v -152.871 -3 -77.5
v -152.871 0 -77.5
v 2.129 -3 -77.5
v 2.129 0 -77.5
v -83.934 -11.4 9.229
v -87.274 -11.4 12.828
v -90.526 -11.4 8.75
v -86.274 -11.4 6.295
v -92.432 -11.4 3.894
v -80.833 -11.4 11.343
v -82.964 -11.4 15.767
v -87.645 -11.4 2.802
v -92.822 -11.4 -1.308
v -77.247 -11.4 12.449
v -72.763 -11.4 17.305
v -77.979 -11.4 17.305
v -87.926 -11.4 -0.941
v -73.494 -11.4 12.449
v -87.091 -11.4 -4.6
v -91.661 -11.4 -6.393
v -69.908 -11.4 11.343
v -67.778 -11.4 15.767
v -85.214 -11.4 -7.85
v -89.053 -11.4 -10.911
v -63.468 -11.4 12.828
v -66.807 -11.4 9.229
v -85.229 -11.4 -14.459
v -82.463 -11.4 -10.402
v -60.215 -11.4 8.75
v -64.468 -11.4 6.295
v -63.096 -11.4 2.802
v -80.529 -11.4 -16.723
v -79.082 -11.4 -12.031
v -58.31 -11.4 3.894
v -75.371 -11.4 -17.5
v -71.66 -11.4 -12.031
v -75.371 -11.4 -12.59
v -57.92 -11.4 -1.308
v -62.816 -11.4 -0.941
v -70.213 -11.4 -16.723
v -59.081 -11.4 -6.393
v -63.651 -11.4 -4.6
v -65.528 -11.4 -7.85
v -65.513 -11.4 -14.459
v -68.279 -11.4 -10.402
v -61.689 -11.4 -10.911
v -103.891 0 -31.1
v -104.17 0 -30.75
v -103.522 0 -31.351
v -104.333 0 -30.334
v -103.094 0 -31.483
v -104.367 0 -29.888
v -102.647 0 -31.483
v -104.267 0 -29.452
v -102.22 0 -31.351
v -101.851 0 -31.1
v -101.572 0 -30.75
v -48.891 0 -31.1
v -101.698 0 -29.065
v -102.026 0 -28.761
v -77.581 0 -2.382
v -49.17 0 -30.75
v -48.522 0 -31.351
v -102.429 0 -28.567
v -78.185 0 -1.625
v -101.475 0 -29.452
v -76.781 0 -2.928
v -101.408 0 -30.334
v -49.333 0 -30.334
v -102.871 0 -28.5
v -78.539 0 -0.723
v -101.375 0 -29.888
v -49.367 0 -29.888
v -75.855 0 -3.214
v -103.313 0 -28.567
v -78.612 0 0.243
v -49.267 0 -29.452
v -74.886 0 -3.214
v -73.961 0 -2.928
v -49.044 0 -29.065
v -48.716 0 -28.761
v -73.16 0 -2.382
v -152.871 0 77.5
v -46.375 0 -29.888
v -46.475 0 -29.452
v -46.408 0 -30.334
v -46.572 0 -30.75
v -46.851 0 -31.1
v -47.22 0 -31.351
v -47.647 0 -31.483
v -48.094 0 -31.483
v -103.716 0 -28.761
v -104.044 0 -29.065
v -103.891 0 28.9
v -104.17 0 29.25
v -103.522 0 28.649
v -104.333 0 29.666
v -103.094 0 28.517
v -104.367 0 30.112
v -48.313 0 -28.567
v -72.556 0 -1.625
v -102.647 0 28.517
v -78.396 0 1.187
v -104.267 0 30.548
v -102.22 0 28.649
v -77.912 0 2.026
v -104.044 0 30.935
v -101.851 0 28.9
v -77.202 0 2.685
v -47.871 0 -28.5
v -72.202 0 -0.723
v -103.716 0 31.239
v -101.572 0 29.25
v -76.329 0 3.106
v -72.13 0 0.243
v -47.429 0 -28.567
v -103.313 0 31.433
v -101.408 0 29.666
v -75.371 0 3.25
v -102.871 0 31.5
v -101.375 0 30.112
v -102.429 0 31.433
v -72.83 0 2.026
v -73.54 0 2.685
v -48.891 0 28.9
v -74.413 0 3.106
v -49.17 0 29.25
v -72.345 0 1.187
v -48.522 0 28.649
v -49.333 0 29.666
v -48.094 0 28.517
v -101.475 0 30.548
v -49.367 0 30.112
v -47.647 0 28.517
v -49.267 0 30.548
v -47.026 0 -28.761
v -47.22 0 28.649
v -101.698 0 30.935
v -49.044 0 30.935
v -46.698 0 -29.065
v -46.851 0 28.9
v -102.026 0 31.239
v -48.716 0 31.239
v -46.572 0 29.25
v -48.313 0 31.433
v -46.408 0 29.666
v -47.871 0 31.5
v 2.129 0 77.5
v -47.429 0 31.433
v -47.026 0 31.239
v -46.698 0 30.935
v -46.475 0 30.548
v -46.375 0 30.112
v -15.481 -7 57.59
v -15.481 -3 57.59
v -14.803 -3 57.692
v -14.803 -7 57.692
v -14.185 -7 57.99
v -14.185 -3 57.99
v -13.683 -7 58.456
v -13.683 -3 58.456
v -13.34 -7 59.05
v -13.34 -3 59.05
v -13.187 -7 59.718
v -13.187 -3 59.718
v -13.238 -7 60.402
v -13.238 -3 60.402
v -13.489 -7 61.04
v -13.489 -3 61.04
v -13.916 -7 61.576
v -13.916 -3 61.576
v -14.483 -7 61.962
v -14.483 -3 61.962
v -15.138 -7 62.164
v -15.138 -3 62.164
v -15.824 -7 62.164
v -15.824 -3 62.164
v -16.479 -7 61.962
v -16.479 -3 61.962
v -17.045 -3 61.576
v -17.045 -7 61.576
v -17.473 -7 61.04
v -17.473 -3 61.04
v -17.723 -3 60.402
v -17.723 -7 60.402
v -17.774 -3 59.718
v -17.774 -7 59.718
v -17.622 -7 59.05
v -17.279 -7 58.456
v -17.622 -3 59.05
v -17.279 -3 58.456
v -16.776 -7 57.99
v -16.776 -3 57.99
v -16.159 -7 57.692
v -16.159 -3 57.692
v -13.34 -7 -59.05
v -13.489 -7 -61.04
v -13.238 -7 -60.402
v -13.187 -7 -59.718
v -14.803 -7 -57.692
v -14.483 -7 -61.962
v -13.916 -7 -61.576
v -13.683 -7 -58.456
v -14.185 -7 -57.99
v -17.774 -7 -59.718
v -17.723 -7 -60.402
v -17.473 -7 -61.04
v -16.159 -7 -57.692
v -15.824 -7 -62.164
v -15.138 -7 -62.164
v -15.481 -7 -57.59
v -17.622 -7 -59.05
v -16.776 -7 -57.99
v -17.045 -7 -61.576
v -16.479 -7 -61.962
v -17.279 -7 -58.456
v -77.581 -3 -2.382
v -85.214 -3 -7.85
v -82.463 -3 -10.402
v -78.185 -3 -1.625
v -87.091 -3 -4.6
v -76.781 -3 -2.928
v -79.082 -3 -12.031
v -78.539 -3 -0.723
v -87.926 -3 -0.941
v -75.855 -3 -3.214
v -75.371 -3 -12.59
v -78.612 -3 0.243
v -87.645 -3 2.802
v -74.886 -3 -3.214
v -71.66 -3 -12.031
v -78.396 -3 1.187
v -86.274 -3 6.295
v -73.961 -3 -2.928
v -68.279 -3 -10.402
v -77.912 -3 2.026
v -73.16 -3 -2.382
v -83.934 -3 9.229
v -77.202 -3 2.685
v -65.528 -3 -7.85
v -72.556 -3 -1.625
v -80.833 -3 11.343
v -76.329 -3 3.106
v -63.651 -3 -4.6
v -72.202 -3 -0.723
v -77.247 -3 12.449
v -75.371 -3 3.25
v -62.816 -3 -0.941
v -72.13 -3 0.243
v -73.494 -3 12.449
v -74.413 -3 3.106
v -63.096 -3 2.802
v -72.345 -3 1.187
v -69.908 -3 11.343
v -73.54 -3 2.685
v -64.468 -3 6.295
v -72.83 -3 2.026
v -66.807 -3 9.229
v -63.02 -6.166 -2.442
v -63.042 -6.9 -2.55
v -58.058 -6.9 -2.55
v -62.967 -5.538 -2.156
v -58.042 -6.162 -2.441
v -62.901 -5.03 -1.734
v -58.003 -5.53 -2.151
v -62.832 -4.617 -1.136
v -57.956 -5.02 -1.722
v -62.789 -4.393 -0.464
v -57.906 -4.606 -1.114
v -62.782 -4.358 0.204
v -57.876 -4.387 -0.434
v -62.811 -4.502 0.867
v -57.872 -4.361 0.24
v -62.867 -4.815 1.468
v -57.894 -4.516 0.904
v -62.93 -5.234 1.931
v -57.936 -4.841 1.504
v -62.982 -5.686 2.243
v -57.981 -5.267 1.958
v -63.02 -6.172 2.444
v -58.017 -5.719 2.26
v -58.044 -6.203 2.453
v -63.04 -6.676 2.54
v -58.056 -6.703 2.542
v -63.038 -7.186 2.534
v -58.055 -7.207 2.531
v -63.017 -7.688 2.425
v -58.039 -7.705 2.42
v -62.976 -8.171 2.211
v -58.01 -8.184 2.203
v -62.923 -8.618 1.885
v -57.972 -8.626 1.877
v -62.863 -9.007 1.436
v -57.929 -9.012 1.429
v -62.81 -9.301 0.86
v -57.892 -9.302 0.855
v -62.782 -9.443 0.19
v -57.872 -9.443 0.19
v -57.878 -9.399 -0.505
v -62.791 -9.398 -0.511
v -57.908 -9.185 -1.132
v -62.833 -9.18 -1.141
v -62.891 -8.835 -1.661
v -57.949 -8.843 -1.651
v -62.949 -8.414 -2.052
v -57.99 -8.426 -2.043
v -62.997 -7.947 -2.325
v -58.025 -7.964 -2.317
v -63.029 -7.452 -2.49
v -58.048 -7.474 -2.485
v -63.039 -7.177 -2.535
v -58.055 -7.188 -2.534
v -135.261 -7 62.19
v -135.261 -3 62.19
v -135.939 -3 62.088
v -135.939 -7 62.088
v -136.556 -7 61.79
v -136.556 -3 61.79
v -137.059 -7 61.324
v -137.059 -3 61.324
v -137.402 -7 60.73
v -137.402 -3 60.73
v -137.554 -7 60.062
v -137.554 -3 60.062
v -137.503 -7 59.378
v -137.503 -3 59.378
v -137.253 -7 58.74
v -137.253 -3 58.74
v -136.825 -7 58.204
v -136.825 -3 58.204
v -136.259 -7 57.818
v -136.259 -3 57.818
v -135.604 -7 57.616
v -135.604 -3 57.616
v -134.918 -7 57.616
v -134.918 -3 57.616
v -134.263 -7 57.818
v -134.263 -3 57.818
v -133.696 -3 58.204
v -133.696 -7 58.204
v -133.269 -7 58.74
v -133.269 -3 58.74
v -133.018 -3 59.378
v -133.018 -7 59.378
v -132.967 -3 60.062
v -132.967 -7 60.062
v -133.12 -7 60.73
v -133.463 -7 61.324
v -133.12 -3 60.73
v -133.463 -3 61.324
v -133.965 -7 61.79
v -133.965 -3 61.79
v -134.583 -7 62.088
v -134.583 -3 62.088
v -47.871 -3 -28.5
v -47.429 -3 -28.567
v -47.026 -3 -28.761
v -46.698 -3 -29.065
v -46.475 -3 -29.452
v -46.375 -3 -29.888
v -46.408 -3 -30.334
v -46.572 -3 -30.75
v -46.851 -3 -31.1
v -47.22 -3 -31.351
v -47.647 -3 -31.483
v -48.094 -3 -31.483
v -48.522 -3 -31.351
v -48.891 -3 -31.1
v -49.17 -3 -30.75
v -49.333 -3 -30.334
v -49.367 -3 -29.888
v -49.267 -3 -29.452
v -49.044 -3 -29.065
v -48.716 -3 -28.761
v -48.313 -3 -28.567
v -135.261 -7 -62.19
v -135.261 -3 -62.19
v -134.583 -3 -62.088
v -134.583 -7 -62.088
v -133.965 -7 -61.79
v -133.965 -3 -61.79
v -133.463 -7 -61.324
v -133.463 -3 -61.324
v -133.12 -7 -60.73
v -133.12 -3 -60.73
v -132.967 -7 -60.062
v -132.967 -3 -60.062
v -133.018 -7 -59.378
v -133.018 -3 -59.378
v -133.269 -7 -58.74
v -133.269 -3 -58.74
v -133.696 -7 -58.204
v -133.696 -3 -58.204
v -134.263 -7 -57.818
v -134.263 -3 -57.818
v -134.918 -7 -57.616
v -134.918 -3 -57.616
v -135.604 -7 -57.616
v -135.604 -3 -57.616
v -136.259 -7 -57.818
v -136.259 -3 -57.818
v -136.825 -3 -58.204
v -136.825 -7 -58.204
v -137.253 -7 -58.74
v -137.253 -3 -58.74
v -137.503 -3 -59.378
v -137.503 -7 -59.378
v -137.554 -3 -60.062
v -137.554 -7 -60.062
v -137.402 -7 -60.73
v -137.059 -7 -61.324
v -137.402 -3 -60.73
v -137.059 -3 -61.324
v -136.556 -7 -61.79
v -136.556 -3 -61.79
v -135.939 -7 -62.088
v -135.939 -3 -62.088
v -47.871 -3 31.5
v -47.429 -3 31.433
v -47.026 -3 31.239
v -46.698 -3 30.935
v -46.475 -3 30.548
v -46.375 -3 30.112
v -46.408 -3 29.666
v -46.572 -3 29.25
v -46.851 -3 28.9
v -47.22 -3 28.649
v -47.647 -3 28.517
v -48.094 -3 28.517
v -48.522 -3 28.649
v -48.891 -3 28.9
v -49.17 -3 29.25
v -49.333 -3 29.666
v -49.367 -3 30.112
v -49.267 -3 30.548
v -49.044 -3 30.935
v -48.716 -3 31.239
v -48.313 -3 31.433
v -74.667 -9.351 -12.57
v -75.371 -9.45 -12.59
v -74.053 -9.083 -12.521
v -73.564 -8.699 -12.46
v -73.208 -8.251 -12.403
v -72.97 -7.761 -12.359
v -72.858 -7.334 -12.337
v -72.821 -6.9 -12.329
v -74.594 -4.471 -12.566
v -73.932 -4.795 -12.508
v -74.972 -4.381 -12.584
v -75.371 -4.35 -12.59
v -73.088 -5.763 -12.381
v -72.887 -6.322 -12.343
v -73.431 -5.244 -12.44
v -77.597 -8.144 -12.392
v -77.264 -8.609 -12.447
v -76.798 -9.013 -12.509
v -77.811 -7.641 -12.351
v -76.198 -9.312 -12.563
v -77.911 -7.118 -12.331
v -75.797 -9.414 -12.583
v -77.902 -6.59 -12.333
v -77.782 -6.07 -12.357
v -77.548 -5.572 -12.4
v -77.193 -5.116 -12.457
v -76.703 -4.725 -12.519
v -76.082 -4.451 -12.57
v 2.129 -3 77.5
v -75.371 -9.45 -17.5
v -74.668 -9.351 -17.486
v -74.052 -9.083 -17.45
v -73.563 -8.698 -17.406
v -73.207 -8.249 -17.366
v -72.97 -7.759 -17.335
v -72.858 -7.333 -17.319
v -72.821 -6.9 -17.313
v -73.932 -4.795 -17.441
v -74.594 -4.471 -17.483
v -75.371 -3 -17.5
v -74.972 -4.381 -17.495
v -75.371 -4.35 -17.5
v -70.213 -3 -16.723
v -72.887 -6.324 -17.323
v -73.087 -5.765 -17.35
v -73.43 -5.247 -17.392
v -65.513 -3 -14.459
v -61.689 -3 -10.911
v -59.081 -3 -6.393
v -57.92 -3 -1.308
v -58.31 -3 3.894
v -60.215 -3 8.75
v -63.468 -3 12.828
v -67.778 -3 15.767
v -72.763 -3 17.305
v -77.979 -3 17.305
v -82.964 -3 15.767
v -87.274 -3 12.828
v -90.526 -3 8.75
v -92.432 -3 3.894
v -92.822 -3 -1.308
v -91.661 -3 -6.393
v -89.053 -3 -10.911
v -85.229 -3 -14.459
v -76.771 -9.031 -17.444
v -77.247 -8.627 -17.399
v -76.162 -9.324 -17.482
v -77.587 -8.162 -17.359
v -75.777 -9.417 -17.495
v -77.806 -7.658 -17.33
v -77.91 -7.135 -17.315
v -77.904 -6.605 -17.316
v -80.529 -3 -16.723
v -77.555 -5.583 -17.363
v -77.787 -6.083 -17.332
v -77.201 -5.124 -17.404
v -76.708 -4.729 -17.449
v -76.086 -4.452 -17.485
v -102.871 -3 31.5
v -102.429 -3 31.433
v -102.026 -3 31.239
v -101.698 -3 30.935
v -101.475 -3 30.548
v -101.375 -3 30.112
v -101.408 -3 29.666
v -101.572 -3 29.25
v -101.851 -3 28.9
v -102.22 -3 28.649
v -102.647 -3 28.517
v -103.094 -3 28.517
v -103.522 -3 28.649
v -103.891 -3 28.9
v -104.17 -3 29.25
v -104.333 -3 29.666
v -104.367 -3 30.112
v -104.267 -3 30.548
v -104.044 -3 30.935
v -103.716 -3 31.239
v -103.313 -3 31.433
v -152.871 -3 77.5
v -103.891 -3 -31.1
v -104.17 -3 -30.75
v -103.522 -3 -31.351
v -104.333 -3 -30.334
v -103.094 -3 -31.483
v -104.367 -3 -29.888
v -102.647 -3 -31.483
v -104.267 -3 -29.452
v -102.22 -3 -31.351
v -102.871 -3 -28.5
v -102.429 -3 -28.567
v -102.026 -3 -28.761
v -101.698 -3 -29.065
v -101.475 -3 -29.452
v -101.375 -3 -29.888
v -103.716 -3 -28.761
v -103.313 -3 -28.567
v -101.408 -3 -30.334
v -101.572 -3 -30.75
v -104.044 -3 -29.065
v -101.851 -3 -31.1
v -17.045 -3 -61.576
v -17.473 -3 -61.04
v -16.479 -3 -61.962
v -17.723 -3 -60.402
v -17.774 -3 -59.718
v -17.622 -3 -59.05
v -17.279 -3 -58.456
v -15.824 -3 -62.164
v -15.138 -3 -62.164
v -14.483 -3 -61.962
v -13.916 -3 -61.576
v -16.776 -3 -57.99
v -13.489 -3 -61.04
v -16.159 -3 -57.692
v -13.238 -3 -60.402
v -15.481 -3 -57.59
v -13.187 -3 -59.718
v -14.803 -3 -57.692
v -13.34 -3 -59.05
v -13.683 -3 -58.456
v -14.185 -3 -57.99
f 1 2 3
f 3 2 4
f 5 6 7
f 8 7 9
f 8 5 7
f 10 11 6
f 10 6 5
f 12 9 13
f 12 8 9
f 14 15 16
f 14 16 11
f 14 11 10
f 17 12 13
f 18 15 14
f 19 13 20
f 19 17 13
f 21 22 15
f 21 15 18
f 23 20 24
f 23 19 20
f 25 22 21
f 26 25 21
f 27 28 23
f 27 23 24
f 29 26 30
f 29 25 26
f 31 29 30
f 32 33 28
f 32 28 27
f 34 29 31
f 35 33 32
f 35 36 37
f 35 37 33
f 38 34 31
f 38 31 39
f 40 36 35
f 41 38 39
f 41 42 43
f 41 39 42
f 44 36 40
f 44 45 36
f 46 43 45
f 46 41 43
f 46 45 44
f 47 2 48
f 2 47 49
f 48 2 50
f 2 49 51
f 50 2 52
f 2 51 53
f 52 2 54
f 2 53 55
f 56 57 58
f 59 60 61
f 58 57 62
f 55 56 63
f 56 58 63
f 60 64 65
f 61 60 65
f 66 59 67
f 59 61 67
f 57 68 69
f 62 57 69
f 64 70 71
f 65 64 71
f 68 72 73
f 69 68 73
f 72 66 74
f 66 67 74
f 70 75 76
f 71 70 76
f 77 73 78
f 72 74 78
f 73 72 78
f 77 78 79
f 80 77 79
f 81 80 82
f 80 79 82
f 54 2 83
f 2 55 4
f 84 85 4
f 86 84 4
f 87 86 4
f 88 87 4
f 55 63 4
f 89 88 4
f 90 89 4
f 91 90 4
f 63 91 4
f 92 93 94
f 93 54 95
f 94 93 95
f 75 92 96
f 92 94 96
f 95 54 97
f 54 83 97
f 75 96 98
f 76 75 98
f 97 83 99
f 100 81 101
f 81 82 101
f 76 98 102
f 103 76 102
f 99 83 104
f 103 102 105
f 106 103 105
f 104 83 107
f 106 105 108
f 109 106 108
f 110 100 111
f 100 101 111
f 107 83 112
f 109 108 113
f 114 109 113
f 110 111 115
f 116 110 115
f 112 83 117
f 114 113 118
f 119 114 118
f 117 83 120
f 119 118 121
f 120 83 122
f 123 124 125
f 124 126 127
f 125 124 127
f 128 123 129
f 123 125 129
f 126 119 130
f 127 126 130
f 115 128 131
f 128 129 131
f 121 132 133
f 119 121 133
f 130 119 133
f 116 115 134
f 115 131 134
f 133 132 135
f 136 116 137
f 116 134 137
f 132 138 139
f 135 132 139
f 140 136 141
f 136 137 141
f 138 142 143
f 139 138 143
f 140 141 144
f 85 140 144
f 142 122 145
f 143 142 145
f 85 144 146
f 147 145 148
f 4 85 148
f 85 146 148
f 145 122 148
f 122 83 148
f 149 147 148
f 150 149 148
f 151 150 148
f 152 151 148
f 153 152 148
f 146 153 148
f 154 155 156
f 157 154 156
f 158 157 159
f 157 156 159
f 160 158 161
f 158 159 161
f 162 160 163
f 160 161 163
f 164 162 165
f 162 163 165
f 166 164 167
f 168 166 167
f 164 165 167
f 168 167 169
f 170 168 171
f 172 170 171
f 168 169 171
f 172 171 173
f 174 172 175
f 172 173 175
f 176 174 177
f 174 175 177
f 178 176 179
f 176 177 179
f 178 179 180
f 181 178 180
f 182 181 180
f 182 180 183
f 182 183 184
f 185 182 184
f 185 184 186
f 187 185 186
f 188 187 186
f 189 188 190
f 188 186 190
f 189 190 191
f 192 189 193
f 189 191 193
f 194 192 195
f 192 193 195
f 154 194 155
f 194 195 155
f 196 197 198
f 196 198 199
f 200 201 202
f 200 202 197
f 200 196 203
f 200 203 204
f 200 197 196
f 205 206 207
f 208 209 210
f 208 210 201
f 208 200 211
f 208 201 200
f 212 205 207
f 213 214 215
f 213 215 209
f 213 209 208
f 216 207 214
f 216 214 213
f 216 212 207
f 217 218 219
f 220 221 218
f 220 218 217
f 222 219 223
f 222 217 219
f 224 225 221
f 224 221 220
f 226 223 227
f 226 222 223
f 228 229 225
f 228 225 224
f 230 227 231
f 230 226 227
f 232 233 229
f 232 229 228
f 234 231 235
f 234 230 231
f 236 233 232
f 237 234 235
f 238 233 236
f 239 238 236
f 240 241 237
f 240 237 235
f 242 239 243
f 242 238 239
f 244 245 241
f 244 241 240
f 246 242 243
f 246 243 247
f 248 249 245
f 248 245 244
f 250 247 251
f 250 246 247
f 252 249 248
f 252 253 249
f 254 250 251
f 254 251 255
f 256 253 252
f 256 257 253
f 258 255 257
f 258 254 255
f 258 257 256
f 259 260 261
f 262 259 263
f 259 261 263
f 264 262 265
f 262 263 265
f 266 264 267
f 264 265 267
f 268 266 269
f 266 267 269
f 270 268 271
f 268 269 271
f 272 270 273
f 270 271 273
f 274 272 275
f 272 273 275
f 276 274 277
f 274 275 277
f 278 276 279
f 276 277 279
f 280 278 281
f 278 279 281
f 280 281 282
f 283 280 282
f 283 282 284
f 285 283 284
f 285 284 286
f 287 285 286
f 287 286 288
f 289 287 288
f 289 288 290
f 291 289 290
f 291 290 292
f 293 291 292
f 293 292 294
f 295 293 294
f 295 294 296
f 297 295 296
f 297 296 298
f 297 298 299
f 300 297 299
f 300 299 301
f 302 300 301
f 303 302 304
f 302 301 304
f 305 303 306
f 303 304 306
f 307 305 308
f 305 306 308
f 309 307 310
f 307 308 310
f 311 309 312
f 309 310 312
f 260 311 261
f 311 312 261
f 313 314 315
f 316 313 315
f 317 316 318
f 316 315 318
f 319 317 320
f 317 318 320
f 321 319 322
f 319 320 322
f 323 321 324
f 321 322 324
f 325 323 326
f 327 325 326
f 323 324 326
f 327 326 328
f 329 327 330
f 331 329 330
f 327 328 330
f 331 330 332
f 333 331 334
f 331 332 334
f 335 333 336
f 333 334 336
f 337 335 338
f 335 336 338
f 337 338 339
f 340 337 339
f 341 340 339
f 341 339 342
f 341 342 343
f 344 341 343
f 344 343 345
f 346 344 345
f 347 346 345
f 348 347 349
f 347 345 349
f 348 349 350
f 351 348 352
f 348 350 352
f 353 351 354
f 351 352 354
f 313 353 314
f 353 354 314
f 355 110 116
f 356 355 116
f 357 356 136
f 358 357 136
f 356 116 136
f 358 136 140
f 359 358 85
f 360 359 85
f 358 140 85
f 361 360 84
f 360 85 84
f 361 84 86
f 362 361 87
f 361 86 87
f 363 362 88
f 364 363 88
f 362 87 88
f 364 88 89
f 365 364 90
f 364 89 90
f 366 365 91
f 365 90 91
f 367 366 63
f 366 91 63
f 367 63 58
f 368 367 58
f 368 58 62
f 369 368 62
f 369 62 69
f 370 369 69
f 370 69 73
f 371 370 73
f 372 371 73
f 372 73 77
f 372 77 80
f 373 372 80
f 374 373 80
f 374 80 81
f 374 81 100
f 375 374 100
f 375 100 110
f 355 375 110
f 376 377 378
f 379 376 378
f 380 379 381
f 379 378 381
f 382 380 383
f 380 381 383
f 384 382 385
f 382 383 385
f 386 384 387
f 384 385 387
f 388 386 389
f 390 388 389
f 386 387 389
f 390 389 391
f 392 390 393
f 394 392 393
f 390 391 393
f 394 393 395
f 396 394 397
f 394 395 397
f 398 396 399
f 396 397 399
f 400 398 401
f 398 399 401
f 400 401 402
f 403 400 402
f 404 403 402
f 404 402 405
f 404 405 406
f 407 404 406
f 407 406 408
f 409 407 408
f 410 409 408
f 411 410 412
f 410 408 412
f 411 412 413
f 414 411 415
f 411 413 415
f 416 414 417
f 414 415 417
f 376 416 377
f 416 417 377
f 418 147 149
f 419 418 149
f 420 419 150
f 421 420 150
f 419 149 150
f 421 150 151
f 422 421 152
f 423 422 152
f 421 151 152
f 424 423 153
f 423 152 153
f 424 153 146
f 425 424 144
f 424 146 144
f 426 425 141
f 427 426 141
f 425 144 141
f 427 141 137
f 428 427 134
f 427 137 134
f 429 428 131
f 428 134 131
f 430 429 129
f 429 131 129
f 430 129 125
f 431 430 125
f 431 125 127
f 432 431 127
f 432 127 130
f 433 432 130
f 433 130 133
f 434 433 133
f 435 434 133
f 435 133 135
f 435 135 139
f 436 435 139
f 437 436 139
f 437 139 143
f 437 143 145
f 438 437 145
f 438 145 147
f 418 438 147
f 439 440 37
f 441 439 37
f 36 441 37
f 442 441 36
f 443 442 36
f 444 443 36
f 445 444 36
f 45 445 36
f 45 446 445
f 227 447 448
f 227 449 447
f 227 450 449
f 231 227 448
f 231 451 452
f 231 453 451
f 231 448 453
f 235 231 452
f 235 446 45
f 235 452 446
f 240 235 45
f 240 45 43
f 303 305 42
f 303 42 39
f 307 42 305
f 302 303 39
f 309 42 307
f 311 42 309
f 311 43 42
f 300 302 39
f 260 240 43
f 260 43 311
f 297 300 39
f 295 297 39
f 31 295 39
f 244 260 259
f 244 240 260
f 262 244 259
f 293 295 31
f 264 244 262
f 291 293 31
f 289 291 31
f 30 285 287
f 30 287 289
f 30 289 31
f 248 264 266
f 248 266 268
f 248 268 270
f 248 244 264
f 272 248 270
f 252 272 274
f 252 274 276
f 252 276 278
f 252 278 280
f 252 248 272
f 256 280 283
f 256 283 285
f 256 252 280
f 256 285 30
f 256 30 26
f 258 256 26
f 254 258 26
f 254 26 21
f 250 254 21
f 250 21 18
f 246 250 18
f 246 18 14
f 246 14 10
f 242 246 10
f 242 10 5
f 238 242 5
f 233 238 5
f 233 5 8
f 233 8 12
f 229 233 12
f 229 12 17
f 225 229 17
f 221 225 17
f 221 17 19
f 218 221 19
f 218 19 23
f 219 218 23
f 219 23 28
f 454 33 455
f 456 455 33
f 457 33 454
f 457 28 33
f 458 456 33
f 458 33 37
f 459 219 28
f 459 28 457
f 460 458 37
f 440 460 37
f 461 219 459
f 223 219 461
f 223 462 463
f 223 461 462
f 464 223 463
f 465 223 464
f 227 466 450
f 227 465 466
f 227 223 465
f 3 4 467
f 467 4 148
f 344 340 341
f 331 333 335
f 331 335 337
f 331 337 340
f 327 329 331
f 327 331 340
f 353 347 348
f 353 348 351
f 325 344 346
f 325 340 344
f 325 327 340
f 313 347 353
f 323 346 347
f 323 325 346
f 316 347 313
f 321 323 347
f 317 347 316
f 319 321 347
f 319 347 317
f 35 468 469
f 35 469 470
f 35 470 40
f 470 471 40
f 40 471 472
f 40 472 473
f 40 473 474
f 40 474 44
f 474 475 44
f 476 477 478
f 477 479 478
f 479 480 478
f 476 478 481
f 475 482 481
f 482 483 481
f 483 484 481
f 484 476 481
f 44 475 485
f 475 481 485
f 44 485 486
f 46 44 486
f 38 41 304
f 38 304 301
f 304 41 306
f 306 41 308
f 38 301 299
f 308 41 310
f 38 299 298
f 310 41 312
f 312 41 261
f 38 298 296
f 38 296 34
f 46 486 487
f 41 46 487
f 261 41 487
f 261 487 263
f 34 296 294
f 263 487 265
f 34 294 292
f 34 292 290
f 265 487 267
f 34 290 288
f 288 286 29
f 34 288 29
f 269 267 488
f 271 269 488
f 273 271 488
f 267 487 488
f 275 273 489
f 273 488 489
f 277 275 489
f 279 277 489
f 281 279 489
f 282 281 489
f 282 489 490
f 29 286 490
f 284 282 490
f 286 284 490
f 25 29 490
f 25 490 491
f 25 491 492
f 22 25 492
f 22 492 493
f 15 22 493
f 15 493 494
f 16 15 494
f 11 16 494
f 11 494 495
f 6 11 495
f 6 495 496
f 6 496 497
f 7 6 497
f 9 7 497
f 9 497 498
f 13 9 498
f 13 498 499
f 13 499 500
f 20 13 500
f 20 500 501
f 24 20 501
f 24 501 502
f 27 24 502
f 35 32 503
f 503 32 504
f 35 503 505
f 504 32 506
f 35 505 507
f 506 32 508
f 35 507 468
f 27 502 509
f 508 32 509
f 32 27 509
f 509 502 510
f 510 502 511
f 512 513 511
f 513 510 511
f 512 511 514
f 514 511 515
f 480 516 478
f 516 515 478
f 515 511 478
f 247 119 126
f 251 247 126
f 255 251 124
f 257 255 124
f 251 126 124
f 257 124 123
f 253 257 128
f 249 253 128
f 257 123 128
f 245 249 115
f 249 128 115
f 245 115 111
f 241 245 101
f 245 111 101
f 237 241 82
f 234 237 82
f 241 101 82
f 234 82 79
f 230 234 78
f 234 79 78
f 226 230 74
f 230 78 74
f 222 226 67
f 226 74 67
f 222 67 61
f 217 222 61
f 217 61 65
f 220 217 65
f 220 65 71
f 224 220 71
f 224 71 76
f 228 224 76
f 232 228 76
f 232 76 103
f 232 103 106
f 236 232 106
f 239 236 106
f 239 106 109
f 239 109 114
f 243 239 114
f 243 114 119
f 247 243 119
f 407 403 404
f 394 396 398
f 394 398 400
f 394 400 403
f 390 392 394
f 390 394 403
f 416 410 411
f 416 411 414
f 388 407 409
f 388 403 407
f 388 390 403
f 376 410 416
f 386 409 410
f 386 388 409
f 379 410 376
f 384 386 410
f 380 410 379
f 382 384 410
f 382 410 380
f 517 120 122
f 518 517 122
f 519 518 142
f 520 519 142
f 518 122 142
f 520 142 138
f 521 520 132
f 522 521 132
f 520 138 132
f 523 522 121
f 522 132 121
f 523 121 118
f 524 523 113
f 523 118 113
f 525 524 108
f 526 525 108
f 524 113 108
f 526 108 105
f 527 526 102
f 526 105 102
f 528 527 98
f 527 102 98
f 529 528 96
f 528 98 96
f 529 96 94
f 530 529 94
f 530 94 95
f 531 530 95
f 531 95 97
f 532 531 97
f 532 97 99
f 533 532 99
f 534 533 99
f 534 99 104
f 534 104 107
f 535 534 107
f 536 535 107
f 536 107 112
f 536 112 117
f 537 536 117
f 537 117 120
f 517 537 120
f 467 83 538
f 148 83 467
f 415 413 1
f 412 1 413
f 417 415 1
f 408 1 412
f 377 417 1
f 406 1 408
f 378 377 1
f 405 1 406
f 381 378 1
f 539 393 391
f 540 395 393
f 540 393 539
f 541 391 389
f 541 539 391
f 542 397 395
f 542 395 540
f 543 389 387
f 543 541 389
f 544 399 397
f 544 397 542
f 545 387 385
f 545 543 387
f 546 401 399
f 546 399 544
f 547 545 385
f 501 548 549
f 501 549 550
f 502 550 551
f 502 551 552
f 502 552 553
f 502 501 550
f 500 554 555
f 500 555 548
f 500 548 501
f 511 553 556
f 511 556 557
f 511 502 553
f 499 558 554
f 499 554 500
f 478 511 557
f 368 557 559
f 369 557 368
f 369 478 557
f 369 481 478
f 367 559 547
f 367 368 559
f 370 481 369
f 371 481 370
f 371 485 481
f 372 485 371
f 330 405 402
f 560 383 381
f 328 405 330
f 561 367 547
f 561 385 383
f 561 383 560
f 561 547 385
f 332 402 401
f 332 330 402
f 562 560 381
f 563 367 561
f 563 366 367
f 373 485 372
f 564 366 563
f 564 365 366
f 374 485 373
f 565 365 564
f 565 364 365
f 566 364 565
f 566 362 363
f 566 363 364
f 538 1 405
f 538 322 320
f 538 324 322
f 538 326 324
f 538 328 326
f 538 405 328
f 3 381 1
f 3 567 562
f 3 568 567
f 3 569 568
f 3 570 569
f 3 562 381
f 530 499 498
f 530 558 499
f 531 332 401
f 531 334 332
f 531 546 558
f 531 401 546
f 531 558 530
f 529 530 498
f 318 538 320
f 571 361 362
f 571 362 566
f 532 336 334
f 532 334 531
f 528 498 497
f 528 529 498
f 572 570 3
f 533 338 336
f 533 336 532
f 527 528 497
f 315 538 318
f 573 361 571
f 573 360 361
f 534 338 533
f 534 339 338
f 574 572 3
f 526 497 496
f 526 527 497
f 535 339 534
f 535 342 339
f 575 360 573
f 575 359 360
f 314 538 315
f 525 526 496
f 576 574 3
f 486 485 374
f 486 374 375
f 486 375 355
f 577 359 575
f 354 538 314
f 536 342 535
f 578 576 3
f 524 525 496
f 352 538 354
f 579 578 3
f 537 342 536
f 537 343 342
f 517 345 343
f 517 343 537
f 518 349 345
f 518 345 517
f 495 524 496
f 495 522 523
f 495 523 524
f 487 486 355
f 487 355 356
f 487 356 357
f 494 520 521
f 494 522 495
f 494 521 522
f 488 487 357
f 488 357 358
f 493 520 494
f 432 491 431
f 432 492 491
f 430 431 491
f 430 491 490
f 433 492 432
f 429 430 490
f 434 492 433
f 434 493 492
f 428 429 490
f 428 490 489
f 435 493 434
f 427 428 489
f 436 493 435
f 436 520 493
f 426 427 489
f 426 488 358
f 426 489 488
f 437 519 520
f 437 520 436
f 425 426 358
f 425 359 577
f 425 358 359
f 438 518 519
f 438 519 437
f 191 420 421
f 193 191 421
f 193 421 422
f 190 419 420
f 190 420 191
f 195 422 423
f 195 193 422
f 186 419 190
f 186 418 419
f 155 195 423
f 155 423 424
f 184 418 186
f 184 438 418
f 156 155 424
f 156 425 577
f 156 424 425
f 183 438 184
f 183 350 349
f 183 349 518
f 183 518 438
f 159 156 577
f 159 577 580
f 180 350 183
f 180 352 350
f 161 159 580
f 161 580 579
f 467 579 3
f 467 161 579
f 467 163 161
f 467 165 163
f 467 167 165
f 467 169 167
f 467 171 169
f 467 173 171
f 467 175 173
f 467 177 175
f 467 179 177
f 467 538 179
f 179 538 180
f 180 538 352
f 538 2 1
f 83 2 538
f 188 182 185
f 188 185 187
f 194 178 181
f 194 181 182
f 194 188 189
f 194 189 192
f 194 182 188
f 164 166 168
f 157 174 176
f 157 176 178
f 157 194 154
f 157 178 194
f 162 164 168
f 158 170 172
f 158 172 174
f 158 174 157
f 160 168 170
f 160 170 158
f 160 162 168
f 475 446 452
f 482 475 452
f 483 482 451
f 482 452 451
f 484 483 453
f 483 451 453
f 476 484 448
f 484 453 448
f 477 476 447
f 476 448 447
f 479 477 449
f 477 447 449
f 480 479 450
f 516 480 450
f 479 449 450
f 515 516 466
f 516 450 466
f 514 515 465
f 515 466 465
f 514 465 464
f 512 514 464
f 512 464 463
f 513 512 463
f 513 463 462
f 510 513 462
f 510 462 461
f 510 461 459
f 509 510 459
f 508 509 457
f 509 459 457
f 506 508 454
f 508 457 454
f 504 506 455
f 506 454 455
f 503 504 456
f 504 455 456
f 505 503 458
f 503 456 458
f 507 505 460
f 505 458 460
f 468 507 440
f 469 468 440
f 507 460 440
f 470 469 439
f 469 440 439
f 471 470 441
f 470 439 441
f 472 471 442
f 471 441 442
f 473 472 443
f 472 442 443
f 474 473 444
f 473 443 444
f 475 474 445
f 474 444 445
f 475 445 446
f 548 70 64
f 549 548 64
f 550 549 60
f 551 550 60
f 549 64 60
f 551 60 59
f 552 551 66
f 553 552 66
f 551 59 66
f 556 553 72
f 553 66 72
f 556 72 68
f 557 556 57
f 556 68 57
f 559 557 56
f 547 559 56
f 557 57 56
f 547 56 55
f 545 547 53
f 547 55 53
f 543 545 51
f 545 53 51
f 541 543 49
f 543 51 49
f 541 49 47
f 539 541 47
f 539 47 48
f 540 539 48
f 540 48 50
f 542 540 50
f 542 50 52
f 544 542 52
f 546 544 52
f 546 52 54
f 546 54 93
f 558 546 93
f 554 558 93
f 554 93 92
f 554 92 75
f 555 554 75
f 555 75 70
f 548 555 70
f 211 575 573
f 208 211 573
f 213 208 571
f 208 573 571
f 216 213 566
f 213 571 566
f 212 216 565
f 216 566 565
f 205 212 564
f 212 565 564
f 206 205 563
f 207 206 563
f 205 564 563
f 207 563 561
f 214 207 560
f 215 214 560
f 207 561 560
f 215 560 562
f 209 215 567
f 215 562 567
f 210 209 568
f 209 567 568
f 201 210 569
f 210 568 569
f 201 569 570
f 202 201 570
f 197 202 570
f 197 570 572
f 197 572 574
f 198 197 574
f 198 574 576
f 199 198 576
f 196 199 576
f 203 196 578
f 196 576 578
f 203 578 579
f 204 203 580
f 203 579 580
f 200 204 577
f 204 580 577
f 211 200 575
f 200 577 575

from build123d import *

# Parameters (mm, degrees)
SKETCH10_W          = 155
SKETCH10_H          = 155
BOSS_EXTRUDE3_DEPTH = 3
SKETCH11_R          = 17.5
SKETCH11_R_2        = 12.59
BOSS_EXTRUDE4_DEPTH = 8.4
SKETCH11_4_R        = 2.3
BOSS_EXTRUDE6_DEPTH = 4
SKETCH12_R          = 2.55
CUT_EXTRUDE1_DEPTH  = 37
SKETCH14_R          = 2.55
CUT_EXTRUDE2_DEPTH  = 75
SKETCH15_R          = 1.5
SKETCH15_R_2        = 3.25
CUT_EXTRUDE3_DEPTH  = 95


with BuildPart() as part:
    # Sketch10 → Boss-Extrude3 (new body)
    with BuildSketch(Plane.XZ):
        with Locations((-75.370825338, 0)):
            Rectangle(SKETCH10_W, SKETCH10_H)
    extrude(amount=BOSS_EXTRUDE3_DEPTH)

    # Sketch11 → Boss-Extrude4 (add)
    with BuildSketch(Plane.XZ.offset(3)):
        with Locations((-75.370825338, 0)):
            Circle(SKETCH11_R)
        with Locations((-75.370825338, 0)):
            Circle(SKETCH11_R_2, mode=Mode.SUBTRACT)
    extrude(amount=BOSS_EXTRUDE4_DEPTH)

    # Sketch11<4> → Boss-Extrude6 (add)
    with BuildSketch(Plane.XZ.offset(3)):
        with Locations((-135.260825338, 59.89)):
            Circle(SKETCH11_4_R)
        with Locations((-15.480825338, 59.89)):
            Circle(SKETCH11_4_R)
        with Locations((-15.480825338, -59.89)):
            Circle(SKETCH11_4_R)
        with Locations((-135.260825338, -59.89)):
            Circle(SKETCH11_4_R)
    extrude(amount=BOSS_EXTRUDE6_DEPTH)

    # Sketch12 → Cut-Extrude1 (cut)
    with BuildSketch(Plane.XY):
        with Locations((-75.370825338, -6.9)):
            Circle(SKETCH12_R)
    extrude(amount=-CUT_EXTRUDE1_DEPTH, mode=Mode.SUBTRACT)

    # Sketch14 → Cut-Extrude2 (cut)
    with BuildSketch(Plane(origin=(0, 0, 0), x_dir=(0, 0, -1), z_dir=(1, 0, 0))):
        with Locations((0, -6.9)):
            Circle(SKETCH14_R)
    extrude(amount=-CUT_EXTRUDE2_DEPTH, mode=Mode.SUBTRACT)

    # Sketch15 → Cut-Extrude3 (cut)
    with BuildSketch(Plane(origin=(0, 0, 0), x_dir=(1, 0, 0), z_dir=(0, 1, 0))):
        with Locations((-102.870825338, 30)):
            Circle(SKETCH15_R)
        with Locations((-47.870825338, 30)):
            Circle(SKETCH15_R)
        with Locations((-47.870825338, -30)):
            Circle(SKETCH15_R)
        with Locations((-102.870825338, -30)):
            Circle(SKETCH15_R)
        with Locations((-75.370825338, 0)):
            Circle(SKETCH15_R_2)
    extrude(amount=-CUT_EXTRUDE3_DEPTH, mode=Mode.SUBTRACT)


solid = part.part
